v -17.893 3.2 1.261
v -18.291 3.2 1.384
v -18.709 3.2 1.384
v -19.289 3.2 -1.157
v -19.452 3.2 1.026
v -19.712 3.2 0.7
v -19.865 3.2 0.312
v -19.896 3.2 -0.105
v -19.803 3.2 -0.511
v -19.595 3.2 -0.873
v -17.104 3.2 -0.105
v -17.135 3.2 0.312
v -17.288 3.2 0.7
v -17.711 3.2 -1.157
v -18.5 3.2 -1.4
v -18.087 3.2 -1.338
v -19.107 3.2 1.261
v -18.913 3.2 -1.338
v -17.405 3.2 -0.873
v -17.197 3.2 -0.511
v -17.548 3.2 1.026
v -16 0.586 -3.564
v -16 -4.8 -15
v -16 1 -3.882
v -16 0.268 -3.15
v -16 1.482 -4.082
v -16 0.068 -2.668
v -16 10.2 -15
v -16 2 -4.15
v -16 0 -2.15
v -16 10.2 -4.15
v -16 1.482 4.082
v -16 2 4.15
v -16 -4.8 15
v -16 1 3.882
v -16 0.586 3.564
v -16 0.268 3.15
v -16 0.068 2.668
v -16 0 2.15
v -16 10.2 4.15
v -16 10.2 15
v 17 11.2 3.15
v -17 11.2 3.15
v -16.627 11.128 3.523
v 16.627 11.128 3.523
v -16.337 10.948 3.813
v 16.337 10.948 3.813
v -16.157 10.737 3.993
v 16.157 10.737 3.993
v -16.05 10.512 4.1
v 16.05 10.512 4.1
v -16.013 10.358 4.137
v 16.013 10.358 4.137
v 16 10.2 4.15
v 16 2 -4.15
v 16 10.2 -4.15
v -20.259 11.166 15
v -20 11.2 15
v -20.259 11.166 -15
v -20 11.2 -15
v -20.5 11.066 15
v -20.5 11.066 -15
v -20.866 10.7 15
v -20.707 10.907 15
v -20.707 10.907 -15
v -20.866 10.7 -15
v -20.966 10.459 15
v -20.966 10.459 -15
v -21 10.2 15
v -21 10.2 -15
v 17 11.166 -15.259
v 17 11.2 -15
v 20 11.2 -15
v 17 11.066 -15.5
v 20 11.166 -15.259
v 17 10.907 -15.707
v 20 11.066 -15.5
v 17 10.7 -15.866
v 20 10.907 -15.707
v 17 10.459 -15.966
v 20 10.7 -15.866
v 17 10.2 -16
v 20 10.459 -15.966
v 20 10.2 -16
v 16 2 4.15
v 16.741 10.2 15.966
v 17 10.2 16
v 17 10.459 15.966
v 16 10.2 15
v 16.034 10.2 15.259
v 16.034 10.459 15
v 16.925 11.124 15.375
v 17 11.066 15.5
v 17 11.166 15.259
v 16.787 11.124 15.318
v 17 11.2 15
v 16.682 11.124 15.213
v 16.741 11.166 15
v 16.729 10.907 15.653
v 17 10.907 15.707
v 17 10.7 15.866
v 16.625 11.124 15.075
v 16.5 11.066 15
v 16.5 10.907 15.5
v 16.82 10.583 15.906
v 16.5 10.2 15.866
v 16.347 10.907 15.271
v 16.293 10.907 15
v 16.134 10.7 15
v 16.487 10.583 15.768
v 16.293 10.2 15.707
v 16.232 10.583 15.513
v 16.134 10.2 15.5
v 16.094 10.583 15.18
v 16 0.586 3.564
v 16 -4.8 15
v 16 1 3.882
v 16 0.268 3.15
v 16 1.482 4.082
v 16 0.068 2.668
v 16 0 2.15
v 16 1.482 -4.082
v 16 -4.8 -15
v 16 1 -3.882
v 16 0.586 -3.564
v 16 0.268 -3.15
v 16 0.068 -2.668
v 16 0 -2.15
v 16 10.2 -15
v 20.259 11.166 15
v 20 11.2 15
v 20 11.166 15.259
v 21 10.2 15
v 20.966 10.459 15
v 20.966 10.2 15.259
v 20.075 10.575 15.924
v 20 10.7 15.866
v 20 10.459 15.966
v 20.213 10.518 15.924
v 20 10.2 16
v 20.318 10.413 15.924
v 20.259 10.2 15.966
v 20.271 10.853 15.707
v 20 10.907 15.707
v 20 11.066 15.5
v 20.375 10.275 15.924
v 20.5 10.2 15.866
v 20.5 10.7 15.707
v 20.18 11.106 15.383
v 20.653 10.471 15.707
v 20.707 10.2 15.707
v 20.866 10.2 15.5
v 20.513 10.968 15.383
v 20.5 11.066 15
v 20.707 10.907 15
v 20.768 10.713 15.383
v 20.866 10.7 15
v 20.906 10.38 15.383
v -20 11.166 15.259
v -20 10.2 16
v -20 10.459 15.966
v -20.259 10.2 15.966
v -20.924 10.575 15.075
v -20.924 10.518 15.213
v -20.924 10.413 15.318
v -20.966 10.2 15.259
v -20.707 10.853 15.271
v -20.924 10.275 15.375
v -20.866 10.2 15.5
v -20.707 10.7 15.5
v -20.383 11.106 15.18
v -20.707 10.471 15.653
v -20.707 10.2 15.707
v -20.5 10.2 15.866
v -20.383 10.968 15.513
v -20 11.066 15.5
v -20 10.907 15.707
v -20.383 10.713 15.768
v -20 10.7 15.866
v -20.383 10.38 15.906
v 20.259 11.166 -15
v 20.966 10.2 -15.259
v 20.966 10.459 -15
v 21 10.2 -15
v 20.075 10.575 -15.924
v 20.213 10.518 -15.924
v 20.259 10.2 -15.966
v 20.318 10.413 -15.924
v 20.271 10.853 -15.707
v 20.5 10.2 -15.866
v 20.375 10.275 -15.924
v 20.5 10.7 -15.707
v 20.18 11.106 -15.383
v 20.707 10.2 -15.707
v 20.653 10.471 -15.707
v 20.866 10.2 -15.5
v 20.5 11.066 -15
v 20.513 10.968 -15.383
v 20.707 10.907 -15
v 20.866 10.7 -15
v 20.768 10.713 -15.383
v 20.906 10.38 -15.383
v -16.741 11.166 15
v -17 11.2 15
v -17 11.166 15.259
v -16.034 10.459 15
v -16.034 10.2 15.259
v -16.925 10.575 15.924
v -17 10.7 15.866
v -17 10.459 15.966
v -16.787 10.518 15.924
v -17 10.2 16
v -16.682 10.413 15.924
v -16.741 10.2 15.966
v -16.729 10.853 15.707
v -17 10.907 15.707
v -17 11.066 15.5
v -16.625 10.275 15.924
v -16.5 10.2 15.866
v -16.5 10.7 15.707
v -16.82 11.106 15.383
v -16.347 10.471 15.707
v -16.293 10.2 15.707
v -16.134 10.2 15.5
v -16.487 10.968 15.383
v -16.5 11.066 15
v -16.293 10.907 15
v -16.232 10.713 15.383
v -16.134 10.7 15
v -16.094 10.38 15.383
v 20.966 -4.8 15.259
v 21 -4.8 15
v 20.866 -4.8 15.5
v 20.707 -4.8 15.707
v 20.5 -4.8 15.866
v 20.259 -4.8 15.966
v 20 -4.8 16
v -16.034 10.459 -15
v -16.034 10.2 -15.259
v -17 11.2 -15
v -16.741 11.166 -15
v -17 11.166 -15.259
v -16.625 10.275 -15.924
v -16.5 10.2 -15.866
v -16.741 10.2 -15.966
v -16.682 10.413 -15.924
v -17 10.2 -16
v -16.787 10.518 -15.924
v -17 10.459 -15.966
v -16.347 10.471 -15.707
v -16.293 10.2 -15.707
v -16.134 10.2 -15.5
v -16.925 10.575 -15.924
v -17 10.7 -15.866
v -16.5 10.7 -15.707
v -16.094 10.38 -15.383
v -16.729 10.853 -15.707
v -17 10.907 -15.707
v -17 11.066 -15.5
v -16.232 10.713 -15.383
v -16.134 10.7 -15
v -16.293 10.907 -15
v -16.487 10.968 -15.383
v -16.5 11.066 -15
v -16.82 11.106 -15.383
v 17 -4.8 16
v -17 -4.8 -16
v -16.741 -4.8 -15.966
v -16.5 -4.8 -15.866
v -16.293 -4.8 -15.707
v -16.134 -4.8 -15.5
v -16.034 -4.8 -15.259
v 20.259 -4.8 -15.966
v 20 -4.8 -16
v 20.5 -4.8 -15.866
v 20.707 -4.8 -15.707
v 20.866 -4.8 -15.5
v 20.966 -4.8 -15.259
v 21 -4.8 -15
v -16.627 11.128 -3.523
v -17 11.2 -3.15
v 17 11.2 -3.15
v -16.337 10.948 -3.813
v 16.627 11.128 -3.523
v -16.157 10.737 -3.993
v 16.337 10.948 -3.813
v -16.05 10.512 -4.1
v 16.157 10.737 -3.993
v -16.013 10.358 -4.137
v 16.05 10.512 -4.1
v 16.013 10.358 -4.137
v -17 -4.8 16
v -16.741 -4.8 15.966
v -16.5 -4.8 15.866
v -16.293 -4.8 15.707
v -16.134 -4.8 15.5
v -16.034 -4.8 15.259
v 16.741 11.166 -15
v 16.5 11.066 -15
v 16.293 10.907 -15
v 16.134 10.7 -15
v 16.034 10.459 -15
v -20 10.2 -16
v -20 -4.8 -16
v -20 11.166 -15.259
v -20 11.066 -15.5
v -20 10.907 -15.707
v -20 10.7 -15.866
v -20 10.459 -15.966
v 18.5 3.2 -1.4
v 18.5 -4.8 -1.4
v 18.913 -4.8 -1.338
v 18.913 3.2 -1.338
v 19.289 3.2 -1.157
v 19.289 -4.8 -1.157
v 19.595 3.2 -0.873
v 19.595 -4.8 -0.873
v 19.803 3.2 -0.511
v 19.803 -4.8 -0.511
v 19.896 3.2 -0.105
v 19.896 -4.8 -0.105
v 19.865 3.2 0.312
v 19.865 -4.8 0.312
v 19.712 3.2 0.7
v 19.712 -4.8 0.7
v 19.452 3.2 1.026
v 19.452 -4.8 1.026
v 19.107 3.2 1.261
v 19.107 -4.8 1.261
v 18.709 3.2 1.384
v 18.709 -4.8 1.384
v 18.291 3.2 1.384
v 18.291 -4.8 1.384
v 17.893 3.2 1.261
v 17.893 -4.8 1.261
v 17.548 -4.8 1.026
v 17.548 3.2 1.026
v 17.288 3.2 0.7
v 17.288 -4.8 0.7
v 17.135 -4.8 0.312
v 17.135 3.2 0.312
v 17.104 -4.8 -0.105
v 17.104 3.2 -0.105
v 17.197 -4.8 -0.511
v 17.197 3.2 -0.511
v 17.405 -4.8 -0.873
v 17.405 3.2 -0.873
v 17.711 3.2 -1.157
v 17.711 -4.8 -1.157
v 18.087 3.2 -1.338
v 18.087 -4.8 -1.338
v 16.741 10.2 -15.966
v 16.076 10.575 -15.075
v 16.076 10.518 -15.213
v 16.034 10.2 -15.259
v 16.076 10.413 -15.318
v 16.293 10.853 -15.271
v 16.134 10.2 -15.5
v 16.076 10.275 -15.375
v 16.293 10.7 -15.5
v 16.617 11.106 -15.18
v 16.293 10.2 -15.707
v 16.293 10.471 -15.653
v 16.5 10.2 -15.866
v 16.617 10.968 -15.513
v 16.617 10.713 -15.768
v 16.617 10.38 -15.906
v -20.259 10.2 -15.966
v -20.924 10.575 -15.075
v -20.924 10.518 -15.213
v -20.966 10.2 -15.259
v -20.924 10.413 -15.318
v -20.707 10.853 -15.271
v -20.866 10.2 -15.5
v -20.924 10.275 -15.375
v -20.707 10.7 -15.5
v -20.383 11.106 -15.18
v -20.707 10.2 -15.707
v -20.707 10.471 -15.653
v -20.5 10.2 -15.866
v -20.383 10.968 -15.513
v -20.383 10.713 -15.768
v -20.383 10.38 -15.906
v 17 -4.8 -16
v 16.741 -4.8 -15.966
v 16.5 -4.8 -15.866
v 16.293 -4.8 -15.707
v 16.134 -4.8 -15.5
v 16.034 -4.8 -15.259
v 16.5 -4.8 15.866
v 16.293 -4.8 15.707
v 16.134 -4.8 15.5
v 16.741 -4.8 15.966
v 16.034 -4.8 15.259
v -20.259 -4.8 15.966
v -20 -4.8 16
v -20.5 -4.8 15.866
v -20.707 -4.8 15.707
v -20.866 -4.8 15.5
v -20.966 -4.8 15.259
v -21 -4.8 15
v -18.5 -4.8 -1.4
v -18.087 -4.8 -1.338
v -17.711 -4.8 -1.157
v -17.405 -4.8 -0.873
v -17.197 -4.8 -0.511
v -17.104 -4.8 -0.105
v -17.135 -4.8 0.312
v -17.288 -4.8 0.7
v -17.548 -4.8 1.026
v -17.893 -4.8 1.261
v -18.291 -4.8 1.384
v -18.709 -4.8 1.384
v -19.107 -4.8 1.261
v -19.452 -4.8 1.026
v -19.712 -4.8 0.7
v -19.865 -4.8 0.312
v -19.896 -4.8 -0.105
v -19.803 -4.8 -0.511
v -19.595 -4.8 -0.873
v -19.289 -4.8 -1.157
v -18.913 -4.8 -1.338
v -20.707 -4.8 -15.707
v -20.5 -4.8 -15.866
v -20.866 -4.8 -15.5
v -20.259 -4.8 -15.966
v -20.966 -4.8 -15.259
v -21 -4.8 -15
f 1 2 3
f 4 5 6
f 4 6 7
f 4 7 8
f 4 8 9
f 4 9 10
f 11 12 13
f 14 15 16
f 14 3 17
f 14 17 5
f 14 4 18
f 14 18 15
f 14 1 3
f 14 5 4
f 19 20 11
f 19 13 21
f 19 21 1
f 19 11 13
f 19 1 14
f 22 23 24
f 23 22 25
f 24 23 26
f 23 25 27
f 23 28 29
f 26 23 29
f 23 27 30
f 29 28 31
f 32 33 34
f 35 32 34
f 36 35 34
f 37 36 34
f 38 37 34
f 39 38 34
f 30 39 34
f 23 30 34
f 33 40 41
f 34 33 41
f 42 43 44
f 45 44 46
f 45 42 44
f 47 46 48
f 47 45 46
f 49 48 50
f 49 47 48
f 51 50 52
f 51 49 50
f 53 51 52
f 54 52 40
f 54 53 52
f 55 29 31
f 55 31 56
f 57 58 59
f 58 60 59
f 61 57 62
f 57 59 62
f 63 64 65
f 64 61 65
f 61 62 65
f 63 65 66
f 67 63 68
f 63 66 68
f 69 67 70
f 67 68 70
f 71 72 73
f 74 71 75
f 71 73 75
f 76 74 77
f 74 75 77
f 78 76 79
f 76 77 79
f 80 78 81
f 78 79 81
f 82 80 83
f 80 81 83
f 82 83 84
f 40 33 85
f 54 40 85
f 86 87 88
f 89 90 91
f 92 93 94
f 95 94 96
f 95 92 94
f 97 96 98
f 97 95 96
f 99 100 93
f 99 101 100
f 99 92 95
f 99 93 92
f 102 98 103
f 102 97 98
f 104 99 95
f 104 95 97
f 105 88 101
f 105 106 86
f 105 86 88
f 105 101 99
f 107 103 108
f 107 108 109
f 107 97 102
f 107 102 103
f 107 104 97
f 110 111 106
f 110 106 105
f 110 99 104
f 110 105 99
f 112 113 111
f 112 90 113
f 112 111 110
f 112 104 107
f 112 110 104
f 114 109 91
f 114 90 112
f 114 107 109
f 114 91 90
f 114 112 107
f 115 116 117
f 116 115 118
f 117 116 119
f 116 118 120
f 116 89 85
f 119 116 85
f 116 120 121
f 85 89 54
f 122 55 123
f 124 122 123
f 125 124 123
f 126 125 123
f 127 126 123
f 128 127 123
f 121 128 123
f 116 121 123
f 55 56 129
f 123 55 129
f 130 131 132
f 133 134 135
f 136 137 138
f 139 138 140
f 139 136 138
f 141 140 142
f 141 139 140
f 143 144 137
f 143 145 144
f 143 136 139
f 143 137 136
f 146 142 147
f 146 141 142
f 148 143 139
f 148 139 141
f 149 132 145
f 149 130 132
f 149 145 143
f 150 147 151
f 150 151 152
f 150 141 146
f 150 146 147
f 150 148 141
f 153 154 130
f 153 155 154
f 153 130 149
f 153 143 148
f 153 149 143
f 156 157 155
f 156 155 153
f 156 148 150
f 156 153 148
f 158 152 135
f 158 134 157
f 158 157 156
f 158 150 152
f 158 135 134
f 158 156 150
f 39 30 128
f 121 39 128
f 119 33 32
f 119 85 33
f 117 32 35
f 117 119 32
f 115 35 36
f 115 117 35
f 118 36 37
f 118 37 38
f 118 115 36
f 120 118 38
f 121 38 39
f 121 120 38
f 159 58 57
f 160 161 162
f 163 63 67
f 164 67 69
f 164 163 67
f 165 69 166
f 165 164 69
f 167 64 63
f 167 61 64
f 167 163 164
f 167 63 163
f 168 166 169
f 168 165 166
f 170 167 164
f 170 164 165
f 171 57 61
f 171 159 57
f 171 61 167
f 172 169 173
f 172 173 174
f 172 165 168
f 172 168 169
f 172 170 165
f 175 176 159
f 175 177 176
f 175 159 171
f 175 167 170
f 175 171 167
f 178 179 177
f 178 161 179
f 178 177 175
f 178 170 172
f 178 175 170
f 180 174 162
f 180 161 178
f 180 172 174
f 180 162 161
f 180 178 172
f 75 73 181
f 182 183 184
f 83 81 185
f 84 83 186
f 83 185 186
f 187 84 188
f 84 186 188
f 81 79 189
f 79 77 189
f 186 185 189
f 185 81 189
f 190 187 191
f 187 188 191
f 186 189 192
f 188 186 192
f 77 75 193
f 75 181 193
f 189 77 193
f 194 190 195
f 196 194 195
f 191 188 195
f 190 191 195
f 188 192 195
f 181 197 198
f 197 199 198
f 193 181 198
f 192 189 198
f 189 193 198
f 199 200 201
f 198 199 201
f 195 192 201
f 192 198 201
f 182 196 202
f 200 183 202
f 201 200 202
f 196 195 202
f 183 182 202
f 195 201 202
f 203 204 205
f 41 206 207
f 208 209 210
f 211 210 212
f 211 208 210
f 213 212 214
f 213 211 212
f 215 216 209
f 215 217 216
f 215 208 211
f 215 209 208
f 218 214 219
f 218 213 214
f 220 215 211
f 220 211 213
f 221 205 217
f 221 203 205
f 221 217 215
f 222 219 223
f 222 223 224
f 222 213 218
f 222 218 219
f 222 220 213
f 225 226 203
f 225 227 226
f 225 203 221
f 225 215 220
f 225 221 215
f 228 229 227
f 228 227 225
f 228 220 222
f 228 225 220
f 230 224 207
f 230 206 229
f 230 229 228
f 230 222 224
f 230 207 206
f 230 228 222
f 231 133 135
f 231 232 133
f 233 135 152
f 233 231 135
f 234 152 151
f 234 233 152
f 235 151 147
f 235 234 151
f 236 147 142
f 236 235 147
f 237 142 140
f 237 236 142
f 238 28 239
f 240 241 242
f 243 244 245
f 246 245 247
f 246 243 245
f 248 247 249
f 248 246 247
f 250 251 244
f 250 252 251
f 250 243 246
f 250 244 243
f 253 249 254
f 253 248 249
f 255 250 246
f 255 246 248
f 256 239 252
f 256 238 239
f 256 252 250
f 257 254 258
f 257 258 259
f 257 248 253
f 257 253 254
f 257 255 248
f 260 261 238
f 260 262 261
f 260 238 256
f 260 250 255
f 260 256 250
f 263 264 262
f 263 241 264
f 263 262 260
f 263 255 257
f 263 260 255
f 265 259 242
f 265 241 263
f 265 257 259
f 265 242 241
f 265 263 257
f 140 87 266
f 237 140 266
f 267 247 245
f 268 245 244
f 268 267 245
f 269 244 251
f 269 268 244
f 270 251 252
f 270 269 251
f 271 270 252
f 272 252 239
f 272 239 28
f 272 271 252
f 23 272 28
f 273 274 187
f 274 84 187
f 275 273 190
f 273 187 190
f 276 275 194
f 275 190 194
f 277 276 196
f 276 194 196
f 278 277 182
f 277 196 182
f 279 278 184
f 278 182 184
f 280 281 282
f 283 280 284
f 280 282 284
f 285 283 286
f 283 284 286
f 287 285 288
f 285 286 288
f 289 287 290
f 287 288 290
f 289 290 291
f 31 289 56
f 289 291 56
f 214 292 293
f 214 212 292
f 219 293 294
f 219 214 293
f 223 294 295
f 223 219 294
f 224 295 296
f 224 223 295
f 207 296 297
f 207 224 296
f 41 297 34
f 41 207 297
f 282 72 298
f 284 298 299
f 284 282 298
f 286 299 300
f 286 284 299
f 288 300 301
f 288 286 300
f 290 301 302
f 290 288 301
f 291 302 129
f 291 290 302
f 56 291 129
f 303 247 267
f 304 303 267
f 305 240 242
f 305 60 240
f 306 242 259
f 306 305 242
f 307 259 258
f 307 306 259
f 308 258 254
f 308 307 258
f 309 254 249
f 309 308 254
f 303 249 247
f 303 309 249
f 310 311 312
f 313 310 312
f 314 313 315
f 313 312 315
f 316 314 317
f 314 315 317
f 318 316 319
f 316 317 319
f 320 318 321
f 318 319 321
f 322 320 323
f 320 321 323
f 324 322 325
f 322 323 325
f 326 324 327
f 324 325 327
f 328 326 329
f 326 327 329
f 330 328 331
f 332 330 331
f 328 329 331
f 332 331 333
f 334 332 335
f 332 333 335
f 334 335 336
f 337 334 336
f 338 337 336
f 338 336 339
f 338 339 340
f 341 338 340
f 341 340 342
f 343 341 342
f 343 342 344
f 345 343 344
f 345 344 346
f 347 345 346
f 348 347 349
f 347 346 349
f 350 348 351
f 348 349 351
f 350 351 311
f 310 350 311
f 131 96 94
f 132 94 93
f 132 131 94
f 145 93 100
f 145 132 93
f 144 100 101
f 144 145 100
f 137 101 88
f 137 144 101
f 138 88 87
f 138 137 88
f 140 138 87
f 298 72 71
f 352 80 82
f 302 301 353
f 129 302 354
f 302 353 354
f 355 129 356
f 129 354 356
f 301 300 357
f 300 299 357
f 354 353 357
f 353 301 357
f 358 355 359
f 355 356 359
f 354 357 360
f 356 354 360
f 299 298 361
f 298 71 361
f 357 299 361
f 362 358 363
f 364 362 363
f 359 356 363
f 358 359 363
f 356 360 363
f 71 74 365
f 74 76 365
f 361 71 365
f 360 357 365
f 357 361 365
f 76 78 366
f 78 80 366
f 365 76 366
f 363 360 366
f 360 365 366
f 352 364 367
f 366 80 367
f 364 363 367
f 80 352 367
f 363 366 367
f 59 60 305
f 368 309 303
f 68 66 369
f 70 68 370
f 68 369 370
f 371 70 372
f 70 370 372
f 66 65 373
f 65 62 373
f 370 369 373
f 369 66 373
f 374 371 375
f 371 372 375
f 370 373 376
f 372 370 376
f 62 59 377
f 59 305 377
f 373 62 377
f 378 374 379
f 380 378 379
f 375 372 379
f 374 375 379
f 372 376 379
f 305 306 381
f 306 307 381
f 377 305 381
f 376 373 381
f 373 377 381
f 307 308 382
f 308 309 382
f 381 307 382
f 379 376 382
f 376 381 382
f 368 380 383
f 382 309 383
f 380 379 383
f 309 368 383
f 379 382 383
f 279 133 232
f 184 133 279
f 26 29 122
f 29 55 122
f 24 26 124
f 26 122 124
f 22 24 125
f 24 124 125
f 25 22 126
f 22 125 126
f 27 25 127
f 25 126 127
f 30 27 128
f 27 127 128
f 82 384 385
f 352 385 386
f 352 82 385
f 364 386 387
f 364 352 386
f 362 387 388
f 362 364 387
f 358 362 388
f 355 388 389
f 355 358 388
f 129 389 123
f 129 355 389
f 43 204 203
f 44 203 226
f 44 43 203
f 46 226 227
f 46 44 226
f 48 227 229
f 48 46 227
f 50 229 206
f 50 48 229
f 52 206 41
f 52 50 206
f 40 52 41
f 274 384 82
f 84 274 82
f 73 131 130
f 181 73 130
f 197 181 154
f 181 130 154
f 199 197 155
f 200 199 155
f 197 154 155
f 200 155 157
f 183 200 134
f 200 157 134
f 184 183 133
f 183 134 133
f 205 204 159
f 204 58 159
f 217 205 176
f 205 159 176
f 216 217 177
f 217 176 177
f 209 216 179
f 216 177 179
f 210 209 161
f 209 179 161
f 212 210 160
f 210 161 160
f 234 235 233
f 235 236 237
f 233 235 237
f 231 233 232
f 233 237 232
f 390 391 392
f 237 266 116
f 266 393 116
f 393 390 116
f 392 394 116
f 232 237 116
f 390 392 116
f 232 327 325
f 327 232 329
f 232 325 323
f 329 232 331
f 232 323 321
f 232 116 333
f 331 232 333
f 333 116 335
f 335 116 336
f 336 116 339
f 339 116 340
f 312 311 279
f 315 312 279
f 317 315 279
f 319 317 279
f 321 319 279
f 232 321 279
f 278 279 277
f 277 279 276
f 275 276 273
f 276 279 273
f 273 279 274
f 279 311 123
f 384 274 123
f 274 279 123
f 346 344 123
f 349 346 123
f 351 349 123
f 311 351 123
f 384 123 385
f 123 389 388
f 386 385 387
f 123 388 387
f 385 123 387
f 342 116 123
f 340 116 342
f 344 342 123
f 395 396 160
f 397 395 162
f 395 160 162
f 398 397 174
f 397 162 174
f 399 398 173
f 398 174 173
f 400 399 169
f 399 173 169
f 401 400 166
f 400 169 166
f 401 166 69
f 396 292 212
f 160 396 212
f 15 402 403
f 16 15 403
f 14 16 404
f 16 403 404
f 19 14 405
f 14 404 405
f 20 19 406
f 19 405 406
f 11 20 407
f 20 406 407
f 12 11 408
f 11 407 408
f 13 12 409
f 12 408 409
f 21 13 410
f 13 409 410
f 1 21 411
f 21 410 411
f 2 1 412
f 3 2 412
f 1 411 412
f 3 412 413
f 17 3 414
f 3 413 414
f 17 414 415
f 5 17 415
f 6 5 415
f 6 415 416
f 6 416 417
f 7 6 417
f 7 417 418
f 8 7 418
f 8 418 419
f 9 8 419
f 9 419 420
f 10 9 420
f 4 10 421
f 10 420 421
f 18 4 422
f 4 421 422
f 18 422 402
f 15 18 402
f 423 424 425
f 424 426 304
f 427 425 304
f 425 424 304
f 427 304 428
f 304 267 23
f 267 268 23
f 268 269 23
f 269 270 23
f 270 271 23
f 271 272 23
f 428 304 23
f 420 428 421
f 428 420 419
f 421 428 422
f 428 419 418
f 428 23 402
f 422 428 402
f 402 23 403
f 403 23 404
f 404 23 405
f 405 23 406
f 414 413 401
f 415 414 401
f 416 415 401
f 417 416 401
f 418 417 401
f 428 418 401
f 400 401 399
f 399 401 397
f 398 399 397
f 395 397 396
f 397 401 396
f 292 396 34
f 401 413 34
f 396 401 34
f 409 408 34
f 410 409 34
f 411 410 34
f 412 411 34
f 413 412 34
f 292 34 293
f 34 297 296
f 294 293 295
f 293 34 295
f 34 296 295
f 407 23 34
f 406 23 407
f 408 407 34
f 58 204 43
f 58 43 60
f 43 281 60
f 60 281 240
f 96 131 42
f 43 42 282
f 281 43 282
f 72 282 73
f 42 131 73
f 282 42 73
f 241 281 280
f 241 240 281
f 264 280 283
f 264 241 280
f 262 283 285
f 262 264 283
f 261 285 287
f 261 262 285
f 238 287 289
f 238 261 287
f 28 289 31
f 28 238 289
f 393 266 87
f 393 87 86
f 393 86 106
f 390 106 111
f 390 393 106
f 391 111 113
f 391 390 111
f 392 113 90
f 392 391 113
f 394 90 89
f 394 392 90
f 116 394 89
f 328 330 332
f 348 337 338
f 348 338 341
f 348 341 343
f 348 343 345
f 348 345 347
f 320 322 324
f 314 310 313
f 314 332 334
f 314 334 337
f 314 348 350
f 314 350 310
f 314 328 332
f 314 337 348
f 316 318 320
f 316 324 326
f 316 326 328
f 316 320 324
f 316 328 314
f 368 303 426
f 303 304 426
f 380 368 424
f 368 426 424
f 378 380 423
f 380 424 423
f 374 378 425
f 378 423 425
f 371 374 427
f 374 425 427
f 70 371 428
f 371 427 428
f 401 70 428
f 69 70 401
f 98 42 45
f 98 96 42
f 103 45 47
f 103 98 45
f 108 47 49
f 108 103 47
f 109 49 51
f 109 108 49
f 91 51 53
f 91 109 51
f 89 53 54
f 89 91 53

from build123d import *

# Parameters (mm, degrees)
SKETCH1_W           = 32
SKETCH1_H           = 8.3
BOSS_EXTRUDE1_DEPTH = 11.2
SKETCH2_W           = 8.3
SKETCH2_H           = 11.2
BOSS_EXTRUDE2_DEPTH = 5
SKETCH3_W           = 8.3
SKETCH3_H           = 11.2
BOSS_EXTRUDE3_DEPTH = 5
FILLET1_R           = 1
FILLET2_R           = 2
SKETCH4_R           = 1.4
CUT_EXTRUDE1_DEPTH  = 8


with BuildPart() as part:
    # Sketch1 → Boss-Extrude1 (new body)
    with BuildSketch(Plane(origin=(0, 0, 0), x_dir=(1, 0, 0), z_dir=(0, 1, 0))):
        Rectangle(SKETCH1_W, SKETCH1_H)
    extrude(amount=BOSS_EXTRUDE1_DEPTH)

    # Sketch2 → Boss-Extrude2 (add)
    with BuildSketch(Plane(origin=(16, 0, 0), x_dir=(0, 0, -1), z_dir=(1, 0, 0))):
        Polygon((-4.15, 11.2), (-16, 11.2), (-16, -4.8), (16, -4.8), (16, 11.2), (4.15, 11.2), (4.15, 0), (-4.15, 0), align=None)
        with Locations((0, 5.6)):
            Rectangle(SKETCH2_W, SKETCH2_H)
    extrude(amount=BOSS_EXTRUDE2_DEPTH)

    # Sketch3 → Boss-Extrude3 (add)
    with BuildSketch(Plane.ZY.offset(16)):
        Polygon((16, 11.2), (4.15, 11.2), (4.15, 0), (-4.15, 0), (-4.15, 11.2), (-16, 11.2), (-16, -4.8), (16, -4.8), align=None)
        with Locations((0, 5.6)):
            Rectangle(SKETCH3_W, SKETCH3_H)
    extrude(amount=BOSS_EXTRUDE3_DEPTH)

    # Fillet1
    fillet1_edges = [part.edges().sort_by_distance(p)[0] for p in [
        (21, 11.2, 0),
        (18.5, 11.2, -16),
        (16, 3.2, 16),
        (18.5, 11.2, 16),
        (21, 3.2, -16),
        (21, 3.2, 16),
        (16, 11.2, -10.075),
        (0, 11.2, 4.15),
        (16, 3.2, -16),
        (16, 11.2, 10.075),
        (-16, 11.2, 10.075),
        (-16, 11.2, -10.075),
        (-18.5, 11.2, 16),
        (-16, 3.2, -16),
        (-18.5, 11.2, -16),
        (-16, 3.2, 16),
        (-21, 11.2, 0),
        (-21, 3.2, -16),
        (-21, 3.2, 16),
        (0, 11.2, -4.15),
    ]]
    fillet(fillet1_edges, radius=FILLET1_R)

    # Fillet2
    fillet2_edges = [part.edges().sort_by_distance(p)[0] for p in [
        (0, 0, 4.15),
        (0, 0, -4.15),
    ]]
    fillet(fillet2_edges, radius=FILLET2_R)

    # Sketch4 → Cut-Extrude1 (cut)
    with BuildSketch(Plane.XZ.offset(4.8)):
        with Locations(Location((-18.5, 0, 0), (0, 0, 270))):
            Circle(SKETCH4_R)
        with Locations(Location((18.5, 0, 0), (0, 0, 270))):
            Circle(SKETCH4_R)
    extrude(amount=-CUT_EXTRUDE1_DEPTH, mode=Mode.SUBTRACT)


solid = part.part
